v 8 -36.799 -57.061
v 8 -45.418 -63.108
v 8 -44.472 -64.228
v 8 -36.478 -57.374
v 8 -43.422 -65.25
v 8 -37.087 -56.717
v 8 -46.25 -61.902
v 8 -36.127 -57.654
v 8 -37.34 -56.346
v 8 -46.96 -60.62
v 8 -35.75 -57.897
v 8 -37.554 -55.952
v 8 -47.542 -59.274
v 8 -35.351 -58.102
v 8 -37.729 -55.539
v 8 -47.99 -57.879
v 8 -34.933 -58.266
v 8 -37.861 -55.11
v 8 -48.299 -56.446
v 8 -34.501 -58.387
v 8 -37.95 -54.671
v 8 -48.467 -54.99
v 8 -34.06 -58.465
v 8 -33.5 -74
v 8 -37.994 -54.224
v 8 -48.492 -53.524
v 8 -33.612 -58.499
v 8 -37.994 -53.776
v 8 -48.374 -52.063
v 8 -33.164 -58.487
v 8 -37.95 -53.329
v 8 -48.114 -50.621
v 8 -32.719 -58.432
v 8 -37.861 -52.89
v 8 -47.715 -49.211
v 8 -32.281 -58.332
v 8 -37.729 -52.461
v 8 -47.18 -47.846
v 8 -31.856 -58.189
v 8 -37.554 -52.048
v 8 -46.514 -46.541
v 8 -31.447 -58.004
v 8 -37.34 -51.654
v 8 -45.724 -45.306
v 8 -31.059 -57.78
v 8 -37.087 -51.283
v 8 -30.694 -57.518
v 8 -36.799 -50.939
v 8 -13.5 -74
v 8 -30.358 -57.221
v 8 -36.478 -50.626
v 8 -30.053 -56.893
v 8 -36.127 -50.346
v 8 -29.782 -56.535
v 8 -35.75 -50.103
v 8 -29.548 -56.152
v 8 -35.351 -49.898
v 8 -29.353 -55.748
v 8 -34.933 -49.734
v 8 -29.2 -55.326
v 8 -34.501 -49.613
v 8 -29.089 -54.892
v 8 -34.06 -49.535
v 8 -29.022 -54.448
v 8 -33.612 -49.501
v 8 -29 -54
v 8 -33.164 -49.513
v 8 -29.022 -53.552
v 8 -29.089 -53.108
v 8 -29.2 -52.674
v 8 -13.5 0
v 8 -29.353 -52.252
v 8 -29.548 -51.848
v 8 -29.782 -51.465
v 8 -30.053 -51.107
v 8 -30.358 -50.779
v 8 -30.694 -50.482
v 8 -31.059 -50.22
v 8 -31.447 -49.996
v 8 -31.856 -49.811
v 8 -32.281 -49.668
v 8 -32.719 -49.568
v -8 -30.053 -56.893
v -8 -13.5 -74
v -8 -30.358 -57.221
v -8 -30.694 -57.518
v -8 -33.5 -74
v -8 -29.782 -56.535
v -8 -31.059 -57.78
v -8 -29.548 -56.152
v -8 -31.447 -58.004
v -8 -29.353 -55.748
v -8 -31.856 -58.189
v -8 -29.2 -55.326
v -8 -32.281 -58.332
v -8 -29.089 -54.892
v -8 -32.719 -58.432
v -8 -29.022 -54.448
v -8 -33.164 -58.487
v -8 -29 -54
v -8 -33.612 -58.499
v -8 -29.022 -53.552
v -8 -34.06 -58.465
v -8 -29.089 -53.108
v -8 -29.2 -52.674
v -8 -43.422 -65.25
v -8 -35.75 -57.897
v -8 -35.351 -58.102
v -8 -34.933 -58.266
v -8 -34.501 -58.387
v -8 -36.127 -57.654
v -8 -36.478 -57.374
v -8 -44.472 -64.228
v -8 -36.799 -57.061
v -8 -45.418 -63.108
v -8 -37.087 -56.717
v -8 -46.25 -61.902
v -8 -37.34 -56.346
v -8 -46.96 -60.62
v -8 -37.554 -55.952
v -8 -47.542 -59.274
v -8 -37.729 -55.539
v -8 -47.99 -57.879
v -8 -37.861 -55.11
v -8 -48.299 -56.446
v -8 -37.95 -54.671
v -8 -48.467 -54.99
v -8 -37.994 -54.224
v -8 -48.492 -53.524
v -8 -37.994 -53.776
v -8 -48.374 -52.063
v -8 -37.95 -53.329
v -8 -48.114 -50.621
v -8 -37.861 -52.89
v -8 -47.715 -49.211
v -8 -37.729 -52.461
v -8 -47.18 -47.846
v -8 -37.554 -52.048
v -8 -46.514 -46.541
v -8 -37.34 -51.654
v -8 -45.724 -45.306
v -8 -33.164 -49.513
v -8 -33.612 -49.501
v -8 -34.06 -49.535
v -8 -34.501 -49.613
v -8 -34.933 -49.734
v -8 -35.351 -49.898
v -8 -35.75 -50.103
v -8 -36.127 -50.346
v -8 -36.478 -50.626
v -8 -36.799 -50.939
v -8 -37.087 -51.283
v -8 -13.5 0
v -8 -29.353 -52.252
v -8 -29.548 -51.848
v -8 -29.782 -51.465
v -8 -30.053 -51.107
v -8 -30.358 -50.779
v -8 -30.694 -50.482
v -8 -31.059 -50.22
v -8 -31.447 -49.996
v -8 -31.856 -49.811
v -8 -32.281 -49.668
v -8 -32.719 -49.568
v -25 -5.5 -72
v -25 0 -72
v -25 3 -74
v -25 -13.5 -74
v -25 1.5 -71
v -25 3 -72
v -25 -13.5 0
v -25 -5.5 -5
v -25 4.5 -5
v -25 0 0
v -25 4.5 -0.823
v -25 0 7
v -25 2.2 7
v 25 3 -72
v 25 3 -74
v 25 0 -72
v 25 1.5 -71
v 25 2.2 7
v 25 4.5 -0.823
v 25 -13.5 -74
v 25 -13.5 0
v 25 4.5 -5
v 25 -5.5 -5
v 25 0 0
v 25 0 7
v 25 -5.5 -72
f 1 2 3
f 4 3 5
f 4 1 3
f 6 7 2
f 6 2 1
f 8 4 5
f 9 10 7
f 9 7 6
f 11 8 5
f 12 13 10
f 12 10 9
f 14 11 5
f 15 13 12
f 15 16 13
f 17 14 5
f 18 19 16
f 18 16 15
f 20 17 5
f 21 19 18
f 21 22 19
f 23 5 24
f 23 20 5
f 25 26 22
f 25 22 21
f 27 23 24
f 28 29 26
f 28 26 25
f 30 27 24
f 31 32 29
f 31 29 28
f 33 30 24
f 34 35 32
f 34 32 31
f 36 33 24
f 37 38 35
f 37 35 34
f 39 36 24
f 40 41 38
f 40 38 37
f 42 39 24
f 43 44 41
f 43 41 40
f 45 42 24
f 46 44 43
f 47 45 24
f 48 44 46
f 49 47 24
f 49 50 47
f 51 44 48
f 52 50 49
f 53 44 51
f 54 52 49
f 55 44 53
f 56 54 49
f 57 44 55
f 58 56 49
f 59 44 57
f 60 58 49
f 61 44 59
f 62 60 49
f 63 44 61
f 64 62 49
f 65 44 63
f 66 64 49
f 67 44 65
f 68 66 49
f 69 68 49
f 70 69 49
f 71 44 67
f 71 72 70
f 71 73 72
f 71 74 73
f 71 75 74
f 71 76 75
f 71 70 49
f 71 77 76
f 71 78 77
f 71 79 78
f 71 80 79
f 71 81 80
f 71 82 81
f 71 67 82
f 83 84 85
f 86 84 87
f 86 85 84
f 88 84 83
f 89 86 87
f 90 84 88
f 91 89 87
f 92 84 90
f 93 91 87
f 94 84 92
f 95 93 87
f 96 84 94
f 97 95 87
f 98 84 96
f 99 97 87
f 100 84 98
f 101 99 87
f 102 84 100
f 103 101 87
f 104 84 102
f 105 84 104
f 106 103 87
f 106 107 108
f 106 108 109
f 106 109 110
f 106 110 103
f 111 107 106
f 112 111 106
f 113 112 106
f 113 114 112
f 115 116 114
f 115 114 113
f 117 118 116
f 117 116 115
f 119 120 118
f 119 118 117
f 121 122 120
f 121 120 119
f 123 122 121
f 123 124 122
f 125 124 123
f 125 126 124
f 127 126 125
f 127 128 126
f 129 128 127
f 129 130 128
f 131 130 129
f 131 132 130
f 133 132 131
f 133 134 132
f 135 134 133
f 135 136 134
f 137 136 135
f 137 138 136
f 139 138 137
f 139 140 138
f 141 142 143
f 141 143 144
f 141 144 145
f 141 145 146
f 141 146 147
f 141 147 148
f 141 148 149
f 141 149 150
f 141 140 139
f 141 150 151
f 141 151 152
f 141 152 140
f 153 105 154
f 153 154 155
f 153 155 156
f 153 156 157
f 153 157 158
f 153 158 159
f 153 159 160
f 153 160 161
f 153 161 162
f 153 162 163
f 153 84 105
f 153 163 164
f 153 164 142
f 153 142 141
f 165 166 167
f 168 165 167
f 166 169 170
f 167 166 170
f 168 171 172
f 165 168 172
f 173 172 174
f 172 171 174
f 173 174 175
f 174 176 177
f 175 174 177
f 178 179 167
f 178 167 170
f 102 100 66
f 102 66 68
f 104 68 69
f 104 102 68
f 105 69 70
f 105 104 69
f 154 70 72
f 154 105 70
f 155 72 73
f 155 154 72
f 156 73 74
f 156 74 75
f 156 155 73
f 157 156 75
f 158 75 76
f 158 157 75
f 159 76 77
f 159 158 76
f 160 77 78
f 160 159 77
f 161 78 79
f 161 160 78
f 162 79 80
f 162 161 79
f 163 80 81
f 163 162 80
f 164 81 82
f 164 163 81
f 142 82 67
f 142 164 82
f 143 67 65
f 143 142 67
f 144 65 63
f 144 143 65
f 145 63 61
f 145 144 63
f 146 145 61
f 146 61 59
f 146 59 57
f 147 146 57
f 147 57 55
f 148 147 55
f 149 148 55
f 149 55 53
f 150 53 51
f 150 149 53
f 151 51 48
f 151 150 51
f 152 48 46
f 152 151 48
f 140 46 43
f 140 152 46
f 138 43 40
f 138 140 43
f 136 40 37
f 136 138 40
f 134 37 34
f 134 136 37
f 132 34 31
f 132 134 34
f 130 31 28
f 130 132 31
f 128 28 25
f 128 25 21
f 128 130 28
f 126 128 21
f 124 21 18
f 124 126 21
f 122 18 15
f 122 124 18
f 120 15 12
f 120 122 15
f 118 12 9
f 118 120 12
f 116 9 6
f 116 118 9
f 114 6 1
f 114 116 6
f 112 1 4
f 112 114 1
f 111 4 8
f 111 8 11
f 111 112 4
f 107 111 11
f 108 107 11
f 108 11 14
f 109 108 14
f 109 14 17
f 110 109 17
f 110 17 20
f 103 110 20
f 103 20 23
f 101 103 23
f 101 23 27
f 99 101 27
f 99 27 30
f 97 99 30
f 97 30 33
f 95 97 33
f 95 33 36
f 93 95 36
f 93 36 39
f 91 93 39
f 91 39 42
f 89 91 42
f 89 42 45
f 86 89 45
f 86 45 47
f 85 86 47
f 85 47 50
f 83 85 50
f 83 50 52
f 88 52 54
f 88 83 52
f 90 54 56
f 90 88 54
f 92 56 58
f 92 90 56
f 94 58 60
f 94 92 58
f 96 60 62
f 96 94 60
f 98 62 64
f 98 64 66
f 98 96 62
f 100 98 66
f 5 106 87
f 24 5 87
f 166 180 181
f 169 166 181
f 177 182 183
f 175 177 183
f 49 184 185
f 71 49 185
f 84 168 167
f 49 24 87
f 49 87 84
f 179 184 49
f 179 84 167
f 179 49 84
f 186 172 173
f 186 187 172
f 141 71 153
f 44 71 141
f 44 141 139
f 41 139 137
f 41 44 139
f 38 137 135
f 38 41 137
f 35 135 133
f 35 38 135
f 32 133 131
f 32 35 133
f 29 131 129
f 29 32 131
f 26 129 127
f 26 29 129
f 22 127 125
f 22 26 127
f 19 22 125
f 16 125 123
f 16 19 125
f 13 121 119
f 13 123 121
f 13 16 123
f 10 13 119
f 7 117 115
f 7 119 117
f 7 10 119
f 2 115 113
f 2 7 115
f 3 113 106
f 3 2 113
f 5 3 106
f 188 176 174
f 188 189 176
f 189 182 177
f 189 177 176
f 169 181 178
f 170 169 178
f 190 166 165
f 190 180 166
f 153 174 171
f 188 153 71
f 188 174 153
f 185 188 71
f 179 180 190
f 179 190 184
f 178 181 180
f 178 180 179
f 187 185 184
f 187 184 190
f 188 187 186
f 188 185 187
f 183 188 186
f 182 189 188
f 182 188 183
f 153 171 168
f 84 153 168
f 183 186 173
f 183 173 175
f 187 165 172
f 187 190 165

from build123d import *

# Parameters (mm, degrees)
F0_R     = 4.5
F1_DEPTH = 25
F3_DEPTH = 50
F5_DEPTH = 50
F6_R     = 4.5
F7_DEPTH = 17
F8_R     = 4.5
F9_DEPTH = 17


with BuildPart() as f1:
    # F0 (on Right) → F1 (new body, symmetric)
    with BuildSketch(Plane.YZ):
        with BuildLine():
            Line((0, 7), (0, 0))
            Line((0, 0), (-13.5, 0))
            Line((-13.5, 0), (-45.723576, -45.306083))
            ThreePointArc((-45.723576, -45.306083), (-48.401067, -55.719942), (-43.421567, -65.25))
            Line((-43.421567, -65.25), (-33.5, -74))
            Line((-33.5, -74), (-13.5, -74))
            Line((-13.5, -74), (3, -74))
            Line((3, -74), (3, -71))
            Line((3, -71), (0, -71))
            Line((0, -71), (0, -72))
            Line((0, -72), (-5.5, -72))
            Line((-5.5, -72), (-5.5, -5))
            Line((-5.5, -5), (4.5, -5))
            Line((4.5, -5), (4.5, 7))
            Line((4.5, 7), (0, 7))
        make_face()
        with Locations((-33.5, -54)):
            Circle(F0_R, mode=Mode.SUBTRACT)
    extrude(amount=F1_DEPTH, both=True)

    # F2 (on face) → F3 (cut, through all)
    with BuildSketch(Plane.YZ.offset(25)):
        Polygon((4.5, 7), (2.2, 7), (4.5, -0.822673), align=None)
    extrude(amount=-F3_DEPTH, mode=Mode.SUBTRACT)

    # F4 (on face) → F5 (cut, through all)
    with BuildSketch(Plane.YZ.offset(25)):
        Polygon((0, -71), (0, -72), (1.5, -71), align=None)
        Polygon((3, -71), (1.5, -71), (3, -72), align=None)
    extrude(amount=-F5_DEPTH, mode=Mode.SUBTRACT)

    # F6 (on face) → F7 (cut)
    with BuildSketch(Plane.YZ.offset(25)):
        with BuildLine():
            Line((-13.5, -74), (-13.5, 0))
            Line((-13.5, 0), (-45.723576, -45.306083))
            ThreePointArc((-45.723576, -45.306083), (-48.401067, -55.719942), (-43.421567, -65.25))
            Line((-43.421567, -65.25), (-33.5, -74))
            Line((-33.5, -74), (-13.5, -74))
        make_face()
        with Locations((-33.5, -54)):
            Circle(F6_R, mode=Mode.SUBTRACT)
    extrude(amount=-F7_DEPTH, mode=Mode.SUBTRACT)

    # F8 (on face) → F9 (cut)
    with BuildSketch(Plane(origin=(-25, 0, 0), x_dir=(0, -1, 0), z_dir=(-1, 0, 0))):
        with BuildLine():
            Line((45.723576, -45.306083), (13.5, 0))
            Line((13.5, 0), (13.5, -74))
            Line((13.5, -74), (33.5, -74))
            Line((33.5, -74), (43.421567, -65.25))
            ThreePointArc((43.421567, -65.25), (48.401067, -55.719942), (45.723576, -45.306083))
        make_face()
        with Locations((33.5, -54)):
            Circle(F8_R, mode=Mode.SUBTRACT)
    extrude(amount=-F9_DEPTH, mode=Mode.SUBTRACT)


solid = f1.part
